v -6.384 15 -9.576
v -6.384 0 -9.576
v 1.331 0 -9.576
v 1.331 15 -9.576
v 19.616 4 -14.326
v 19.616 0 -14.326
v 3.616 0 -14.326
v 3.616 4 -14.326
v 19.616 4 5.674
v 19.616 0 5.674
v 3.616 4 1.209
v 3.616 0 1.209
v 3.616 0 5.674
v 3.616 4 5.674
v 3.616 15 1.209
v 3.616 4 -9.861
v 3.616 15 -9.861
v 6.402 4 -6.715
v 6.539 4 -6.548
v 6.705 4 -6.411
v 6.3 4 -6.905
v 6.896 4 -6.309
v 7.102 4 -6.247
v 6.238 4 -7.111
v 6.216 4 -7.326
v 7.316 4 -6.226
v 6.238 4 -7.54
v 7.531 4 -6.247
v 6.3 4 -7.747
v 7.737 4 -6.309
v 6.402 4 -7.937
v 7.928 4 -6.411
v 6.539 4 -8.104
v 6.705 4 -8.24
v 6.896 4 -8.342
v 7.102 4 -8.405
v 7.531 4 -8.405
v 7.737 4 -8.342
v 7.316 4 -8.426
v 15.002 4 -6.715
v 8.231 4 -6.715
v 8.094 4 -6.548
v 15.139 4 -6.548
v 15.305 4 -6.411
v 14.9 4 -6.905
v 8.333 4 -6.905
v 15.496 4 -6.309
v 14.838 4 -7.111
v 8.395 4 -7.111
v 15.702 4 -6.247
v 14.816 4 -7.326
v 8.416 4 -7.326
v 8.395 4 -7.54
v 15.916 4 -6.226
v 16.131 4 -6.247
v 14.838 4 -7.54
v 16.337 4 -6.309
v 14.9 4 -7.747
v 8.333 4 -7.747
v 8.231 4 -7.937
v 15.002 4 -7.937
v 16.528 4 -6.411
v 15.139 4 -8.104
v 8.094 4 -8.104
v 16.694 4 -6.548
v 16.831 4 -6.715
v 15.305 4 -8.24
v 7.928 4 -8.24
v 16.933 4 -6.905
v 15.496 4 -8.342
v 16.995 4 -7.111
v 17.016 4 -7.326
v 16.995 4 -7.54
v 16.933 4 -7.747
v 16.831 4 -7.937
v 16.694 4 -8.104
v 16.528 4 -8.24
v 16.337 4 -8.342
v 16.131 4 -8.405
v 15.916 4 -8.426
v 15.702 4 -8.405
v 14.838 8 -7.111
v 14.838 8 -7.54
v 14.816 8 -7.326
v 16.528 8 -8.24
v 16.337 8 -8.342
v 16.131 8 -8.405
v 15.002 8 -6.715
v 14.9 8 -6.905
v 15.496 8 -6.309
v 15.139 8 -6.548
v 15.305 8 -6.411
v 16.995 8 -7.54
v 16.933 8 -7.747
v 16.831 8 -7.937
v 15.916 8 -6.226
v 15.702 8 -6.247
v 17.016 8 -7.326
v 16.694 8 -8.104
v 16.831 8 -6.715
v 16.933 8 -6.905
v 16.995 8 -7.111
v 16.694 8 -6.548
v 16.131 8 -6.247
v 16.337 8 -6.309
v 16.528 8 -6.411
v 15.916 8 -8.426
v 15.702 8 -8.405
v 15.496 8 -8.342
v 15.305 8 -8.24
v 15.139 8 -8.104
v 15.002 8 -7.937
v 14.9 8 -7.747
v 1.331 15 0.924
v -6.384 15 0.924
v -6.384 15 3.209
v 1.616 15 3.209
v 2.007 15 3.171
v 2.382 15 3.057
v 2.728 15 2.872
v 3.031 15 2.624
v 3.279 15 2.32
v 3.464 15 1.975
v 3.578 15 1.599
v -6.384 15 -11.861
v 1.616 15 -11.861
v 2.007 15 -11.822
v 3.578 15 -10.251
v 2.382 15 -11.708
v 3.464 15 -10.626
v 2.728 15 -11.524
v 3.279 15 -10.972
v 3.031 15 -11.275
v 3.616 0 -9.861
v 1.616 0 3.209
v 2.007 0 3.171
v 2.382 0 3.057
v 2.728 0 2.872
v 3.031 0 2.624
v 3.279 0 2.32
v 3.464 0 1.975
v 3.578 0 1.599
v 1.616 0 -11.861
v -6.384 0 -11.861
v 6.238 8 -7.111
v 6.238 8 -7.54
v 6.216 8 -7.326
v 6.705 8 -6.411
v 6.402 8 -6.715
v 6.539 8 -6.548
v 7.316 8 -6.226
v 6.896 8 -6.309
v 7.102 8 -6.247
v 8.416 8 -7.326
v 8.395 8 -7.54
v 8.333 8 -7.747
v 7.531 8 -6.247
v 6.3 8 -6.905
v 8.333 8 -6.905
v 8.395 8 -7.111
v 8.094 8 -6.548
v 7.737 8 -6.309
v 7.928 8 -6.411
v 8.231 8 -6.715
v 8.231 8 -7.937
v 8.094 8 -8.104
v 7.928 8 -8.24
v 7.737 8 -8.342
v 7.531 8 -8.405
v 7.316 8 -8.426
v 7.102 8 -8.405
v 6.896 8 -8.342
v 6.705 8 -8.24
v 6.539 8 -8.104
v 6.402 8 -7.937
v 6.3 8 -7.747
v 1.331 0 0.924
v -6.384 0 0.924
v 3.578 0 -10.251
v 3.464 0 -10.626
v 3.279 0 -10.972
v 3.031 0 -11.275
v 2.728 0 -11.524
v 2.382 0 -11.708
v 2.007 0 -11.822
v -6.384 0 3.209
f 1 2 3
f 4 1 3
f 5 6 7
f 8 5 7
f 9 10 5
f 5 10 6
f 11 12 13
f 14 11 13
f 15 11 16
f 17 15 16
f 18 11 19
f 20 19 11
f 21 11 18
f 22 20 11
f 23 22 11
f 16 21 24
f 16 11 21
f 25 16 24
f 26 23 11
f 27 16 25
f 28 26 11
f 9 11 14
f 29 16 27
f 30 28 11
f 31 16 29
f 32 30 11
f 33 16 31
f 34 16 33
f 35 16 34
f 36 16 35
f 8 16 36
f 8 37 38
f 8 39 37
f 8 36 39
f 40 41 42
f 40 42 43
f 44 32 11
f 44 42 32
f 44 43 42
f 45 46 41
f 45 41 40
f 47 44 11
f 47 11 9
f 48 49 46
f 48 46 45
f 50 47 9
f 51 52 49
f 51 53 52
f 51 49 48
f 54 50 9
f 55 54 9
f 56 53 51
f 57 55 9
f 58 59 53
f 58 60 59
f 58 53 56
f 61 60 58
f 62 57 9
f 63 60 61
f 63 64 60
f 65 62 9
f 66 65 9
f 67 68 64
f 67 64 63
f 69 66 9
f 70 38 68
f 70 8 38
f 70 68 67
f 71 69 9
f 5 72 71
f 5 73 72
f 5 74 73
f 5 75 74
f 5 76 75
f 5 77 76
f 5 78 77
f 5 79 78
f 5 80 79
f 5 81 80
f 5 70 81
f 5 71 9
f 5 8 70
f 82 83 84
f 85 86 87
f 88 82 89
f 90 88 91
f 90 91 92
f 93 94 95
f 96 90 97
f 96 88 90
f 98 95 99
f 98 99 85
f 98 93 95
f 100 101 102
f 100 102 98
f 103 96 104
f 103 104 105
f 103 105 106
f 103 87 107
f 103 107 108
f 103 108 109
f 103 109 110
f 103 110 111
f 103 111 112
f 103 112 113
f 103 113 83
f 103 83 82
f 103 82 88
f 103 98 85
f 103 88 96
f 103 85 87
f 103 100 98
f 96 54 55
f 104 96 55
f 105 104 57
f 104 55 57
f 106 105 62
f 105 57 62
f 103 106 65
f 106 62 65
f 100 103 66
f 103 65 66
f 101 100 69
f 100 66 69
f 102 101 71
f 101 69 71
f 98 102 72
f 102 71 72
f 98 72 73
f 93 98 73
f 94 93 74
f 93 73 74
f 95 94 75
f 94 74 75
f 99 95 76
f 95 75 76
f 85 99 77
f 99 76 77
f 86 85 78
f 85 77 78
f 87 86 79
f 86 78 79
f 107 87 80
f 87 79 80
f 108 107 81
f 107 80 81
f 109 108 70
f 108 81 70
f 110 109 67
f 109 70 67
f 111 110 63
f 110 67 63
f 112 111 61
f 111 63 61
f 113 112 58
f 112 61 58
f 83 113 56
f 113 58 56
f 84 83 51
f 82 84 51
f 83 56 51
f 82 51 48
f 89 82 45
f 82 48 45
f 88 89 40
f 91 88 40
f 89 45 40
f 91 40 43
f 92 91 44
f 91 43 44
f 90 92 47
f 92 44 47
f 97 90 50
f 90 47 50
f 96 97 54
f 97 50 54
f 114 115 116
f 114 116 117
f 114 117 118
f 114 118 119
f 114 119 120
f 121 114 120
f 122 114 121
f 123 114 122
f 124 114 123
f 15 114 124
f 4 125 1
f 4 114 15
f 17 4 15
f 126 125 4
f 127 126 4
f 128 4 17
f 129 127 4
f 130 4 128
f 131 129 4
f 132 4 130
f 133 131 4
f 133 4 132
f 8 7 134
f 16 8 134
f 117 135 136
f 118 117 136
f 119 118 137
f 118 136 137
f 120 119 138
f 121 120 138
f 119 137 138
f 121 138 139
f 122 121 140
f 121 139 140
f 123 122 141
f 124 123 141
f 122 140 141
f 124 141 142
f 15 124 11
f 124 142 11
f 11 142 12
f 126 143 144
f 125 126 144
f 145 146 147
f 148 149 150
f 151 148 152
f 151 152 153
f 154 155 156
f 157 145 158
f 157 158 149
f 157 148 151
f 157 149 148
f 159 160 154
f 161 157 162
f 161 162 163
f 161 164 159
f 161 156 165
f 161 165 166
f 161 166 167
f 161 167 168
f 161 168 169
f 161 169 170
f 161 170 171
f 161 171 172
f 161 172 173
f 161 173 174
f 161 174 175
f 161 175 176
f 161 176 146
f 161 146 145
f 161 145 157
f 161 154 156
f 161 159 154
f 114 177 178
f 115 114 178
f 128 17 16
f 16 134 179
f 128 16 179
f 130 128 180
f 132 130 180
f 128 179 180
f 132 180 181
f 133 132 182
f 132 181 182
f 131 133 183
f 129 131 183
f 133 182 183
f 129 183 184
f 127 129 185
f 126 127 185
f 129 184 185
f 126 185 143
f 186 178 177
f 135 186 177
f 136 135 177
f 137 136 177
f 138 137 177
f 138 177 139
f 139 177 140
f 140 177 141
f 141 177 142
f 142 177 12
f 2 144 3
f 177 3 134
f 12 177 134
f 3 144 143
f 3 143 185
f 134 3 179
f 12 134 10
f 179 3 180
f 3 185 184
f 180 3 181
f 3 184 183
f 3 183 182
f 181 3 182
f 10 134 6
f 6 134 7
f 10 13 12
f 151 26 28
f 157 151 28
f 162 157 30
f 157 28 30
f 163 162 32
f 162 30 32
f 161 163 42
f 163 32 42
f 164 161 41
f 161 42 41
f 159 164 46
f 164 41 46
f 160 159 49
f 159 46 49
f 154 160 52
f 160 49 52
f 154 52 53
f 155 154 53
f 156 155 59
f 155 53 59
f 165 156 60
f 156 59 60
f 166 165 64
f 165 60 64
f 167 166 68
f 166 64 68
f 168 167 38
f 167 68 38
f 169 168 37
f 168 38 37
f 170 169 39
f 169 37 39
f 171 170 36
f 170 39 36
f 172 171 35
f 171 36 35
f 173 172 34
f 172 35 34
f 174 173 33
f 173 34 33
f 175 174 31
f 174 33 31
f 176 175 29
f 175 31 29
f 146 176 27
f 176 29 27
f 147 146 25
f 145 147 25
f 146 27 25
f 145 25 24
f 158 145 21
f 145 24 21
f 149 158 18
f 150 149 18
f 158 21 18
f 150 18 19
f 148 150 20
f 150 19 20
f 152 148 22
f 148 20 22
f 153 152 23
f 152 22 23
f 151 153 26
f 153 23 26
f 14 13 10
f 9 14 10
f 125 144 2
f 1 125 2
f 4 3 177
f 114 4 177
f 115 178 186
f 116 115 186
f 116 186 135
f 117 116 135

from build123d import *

# Parameters (mm, degrees)
EXTRUDE_3_DEPTH = 15
EXTRUDE_4_DEPTH = 4
SKETCH_8_R      = 1.1
EXTRUDE_5_DEPTH = 4


with BuildPart() as part:
    # 草图3 → 凸台-拉伸3 (new body)
    with BuildSketch(Plane(origin=(0, 0, 0), x_dir=(1, 0, 0), z_dir=(0, 1, 0))):
        with BuildLine():
            Line((1.616451797, 11.860683611), (-6.383548203, 11.860683611))
            Line((-6.383548203, 11.860683611), (-6.383548203, 9.575683611))
            Line((-6.383548203, 9.575683611), (1.331451797, 9.575683611))
            Line((1.331451797, 9.575683611), (1.331451797, -0.924316389))
            Line((1.331451797, -0.924316389), (-6.383548203, -0.924316389))
            Line((-6.383548203, -0.924316389), (-6.383548203, -3.209316389))
            Line((-6.383548203, -3.209316389), (1.616451797, -3.209316389))
            ThreePointArc((1.616451797, -3.209316389), (3.030665359, -2.623529952), (3.616451797, -1.209316389))
            Line((3.616451797, -1.209316389), (3.616451797, 9.860683611))
            ThreePointArc((3.616451797, 9.860683611), (3.030665359, 11.274897173), (1.616451797, 11.860683611))
        make_face()
    extrude(amount=EXTRUDE_3_DEPTH)

    # 草图3<4> → 凸台-拉伸4 (add)
    with BuildSketch(Plane(origin=(0, 0, 0), x_dir=(1, 0, 0), z_dir=(0, 1, 0))):
        Polygon((3.616451797, 14.325683611), (3.616451797, 9.860683611), (3.616451797, -1.209316389), (3.616451797, -5.674316389), (19.616451797, -5.674316389), (19.616451797, 14.325683611), align=None)
    extrude(amount=EXTRUDE_4_DEPTH)

    # 草图8 → 凸台-拉伸5 (add)
    with BuildSketch(Plane(origin=(0, 4, 0), x_dir=(1, 0, 0), z_dir=(0, 1, 0))):
        with Locations((7.316451797, 7.325683611)):
            Circle(SKETCH_8_R)
        with Locations((15.916451797, 7.325683611)):
            Circle(SKETCH_8_R)
    extrude(amount=EXTRUDE_5_DEPTH)


solid = part.part
